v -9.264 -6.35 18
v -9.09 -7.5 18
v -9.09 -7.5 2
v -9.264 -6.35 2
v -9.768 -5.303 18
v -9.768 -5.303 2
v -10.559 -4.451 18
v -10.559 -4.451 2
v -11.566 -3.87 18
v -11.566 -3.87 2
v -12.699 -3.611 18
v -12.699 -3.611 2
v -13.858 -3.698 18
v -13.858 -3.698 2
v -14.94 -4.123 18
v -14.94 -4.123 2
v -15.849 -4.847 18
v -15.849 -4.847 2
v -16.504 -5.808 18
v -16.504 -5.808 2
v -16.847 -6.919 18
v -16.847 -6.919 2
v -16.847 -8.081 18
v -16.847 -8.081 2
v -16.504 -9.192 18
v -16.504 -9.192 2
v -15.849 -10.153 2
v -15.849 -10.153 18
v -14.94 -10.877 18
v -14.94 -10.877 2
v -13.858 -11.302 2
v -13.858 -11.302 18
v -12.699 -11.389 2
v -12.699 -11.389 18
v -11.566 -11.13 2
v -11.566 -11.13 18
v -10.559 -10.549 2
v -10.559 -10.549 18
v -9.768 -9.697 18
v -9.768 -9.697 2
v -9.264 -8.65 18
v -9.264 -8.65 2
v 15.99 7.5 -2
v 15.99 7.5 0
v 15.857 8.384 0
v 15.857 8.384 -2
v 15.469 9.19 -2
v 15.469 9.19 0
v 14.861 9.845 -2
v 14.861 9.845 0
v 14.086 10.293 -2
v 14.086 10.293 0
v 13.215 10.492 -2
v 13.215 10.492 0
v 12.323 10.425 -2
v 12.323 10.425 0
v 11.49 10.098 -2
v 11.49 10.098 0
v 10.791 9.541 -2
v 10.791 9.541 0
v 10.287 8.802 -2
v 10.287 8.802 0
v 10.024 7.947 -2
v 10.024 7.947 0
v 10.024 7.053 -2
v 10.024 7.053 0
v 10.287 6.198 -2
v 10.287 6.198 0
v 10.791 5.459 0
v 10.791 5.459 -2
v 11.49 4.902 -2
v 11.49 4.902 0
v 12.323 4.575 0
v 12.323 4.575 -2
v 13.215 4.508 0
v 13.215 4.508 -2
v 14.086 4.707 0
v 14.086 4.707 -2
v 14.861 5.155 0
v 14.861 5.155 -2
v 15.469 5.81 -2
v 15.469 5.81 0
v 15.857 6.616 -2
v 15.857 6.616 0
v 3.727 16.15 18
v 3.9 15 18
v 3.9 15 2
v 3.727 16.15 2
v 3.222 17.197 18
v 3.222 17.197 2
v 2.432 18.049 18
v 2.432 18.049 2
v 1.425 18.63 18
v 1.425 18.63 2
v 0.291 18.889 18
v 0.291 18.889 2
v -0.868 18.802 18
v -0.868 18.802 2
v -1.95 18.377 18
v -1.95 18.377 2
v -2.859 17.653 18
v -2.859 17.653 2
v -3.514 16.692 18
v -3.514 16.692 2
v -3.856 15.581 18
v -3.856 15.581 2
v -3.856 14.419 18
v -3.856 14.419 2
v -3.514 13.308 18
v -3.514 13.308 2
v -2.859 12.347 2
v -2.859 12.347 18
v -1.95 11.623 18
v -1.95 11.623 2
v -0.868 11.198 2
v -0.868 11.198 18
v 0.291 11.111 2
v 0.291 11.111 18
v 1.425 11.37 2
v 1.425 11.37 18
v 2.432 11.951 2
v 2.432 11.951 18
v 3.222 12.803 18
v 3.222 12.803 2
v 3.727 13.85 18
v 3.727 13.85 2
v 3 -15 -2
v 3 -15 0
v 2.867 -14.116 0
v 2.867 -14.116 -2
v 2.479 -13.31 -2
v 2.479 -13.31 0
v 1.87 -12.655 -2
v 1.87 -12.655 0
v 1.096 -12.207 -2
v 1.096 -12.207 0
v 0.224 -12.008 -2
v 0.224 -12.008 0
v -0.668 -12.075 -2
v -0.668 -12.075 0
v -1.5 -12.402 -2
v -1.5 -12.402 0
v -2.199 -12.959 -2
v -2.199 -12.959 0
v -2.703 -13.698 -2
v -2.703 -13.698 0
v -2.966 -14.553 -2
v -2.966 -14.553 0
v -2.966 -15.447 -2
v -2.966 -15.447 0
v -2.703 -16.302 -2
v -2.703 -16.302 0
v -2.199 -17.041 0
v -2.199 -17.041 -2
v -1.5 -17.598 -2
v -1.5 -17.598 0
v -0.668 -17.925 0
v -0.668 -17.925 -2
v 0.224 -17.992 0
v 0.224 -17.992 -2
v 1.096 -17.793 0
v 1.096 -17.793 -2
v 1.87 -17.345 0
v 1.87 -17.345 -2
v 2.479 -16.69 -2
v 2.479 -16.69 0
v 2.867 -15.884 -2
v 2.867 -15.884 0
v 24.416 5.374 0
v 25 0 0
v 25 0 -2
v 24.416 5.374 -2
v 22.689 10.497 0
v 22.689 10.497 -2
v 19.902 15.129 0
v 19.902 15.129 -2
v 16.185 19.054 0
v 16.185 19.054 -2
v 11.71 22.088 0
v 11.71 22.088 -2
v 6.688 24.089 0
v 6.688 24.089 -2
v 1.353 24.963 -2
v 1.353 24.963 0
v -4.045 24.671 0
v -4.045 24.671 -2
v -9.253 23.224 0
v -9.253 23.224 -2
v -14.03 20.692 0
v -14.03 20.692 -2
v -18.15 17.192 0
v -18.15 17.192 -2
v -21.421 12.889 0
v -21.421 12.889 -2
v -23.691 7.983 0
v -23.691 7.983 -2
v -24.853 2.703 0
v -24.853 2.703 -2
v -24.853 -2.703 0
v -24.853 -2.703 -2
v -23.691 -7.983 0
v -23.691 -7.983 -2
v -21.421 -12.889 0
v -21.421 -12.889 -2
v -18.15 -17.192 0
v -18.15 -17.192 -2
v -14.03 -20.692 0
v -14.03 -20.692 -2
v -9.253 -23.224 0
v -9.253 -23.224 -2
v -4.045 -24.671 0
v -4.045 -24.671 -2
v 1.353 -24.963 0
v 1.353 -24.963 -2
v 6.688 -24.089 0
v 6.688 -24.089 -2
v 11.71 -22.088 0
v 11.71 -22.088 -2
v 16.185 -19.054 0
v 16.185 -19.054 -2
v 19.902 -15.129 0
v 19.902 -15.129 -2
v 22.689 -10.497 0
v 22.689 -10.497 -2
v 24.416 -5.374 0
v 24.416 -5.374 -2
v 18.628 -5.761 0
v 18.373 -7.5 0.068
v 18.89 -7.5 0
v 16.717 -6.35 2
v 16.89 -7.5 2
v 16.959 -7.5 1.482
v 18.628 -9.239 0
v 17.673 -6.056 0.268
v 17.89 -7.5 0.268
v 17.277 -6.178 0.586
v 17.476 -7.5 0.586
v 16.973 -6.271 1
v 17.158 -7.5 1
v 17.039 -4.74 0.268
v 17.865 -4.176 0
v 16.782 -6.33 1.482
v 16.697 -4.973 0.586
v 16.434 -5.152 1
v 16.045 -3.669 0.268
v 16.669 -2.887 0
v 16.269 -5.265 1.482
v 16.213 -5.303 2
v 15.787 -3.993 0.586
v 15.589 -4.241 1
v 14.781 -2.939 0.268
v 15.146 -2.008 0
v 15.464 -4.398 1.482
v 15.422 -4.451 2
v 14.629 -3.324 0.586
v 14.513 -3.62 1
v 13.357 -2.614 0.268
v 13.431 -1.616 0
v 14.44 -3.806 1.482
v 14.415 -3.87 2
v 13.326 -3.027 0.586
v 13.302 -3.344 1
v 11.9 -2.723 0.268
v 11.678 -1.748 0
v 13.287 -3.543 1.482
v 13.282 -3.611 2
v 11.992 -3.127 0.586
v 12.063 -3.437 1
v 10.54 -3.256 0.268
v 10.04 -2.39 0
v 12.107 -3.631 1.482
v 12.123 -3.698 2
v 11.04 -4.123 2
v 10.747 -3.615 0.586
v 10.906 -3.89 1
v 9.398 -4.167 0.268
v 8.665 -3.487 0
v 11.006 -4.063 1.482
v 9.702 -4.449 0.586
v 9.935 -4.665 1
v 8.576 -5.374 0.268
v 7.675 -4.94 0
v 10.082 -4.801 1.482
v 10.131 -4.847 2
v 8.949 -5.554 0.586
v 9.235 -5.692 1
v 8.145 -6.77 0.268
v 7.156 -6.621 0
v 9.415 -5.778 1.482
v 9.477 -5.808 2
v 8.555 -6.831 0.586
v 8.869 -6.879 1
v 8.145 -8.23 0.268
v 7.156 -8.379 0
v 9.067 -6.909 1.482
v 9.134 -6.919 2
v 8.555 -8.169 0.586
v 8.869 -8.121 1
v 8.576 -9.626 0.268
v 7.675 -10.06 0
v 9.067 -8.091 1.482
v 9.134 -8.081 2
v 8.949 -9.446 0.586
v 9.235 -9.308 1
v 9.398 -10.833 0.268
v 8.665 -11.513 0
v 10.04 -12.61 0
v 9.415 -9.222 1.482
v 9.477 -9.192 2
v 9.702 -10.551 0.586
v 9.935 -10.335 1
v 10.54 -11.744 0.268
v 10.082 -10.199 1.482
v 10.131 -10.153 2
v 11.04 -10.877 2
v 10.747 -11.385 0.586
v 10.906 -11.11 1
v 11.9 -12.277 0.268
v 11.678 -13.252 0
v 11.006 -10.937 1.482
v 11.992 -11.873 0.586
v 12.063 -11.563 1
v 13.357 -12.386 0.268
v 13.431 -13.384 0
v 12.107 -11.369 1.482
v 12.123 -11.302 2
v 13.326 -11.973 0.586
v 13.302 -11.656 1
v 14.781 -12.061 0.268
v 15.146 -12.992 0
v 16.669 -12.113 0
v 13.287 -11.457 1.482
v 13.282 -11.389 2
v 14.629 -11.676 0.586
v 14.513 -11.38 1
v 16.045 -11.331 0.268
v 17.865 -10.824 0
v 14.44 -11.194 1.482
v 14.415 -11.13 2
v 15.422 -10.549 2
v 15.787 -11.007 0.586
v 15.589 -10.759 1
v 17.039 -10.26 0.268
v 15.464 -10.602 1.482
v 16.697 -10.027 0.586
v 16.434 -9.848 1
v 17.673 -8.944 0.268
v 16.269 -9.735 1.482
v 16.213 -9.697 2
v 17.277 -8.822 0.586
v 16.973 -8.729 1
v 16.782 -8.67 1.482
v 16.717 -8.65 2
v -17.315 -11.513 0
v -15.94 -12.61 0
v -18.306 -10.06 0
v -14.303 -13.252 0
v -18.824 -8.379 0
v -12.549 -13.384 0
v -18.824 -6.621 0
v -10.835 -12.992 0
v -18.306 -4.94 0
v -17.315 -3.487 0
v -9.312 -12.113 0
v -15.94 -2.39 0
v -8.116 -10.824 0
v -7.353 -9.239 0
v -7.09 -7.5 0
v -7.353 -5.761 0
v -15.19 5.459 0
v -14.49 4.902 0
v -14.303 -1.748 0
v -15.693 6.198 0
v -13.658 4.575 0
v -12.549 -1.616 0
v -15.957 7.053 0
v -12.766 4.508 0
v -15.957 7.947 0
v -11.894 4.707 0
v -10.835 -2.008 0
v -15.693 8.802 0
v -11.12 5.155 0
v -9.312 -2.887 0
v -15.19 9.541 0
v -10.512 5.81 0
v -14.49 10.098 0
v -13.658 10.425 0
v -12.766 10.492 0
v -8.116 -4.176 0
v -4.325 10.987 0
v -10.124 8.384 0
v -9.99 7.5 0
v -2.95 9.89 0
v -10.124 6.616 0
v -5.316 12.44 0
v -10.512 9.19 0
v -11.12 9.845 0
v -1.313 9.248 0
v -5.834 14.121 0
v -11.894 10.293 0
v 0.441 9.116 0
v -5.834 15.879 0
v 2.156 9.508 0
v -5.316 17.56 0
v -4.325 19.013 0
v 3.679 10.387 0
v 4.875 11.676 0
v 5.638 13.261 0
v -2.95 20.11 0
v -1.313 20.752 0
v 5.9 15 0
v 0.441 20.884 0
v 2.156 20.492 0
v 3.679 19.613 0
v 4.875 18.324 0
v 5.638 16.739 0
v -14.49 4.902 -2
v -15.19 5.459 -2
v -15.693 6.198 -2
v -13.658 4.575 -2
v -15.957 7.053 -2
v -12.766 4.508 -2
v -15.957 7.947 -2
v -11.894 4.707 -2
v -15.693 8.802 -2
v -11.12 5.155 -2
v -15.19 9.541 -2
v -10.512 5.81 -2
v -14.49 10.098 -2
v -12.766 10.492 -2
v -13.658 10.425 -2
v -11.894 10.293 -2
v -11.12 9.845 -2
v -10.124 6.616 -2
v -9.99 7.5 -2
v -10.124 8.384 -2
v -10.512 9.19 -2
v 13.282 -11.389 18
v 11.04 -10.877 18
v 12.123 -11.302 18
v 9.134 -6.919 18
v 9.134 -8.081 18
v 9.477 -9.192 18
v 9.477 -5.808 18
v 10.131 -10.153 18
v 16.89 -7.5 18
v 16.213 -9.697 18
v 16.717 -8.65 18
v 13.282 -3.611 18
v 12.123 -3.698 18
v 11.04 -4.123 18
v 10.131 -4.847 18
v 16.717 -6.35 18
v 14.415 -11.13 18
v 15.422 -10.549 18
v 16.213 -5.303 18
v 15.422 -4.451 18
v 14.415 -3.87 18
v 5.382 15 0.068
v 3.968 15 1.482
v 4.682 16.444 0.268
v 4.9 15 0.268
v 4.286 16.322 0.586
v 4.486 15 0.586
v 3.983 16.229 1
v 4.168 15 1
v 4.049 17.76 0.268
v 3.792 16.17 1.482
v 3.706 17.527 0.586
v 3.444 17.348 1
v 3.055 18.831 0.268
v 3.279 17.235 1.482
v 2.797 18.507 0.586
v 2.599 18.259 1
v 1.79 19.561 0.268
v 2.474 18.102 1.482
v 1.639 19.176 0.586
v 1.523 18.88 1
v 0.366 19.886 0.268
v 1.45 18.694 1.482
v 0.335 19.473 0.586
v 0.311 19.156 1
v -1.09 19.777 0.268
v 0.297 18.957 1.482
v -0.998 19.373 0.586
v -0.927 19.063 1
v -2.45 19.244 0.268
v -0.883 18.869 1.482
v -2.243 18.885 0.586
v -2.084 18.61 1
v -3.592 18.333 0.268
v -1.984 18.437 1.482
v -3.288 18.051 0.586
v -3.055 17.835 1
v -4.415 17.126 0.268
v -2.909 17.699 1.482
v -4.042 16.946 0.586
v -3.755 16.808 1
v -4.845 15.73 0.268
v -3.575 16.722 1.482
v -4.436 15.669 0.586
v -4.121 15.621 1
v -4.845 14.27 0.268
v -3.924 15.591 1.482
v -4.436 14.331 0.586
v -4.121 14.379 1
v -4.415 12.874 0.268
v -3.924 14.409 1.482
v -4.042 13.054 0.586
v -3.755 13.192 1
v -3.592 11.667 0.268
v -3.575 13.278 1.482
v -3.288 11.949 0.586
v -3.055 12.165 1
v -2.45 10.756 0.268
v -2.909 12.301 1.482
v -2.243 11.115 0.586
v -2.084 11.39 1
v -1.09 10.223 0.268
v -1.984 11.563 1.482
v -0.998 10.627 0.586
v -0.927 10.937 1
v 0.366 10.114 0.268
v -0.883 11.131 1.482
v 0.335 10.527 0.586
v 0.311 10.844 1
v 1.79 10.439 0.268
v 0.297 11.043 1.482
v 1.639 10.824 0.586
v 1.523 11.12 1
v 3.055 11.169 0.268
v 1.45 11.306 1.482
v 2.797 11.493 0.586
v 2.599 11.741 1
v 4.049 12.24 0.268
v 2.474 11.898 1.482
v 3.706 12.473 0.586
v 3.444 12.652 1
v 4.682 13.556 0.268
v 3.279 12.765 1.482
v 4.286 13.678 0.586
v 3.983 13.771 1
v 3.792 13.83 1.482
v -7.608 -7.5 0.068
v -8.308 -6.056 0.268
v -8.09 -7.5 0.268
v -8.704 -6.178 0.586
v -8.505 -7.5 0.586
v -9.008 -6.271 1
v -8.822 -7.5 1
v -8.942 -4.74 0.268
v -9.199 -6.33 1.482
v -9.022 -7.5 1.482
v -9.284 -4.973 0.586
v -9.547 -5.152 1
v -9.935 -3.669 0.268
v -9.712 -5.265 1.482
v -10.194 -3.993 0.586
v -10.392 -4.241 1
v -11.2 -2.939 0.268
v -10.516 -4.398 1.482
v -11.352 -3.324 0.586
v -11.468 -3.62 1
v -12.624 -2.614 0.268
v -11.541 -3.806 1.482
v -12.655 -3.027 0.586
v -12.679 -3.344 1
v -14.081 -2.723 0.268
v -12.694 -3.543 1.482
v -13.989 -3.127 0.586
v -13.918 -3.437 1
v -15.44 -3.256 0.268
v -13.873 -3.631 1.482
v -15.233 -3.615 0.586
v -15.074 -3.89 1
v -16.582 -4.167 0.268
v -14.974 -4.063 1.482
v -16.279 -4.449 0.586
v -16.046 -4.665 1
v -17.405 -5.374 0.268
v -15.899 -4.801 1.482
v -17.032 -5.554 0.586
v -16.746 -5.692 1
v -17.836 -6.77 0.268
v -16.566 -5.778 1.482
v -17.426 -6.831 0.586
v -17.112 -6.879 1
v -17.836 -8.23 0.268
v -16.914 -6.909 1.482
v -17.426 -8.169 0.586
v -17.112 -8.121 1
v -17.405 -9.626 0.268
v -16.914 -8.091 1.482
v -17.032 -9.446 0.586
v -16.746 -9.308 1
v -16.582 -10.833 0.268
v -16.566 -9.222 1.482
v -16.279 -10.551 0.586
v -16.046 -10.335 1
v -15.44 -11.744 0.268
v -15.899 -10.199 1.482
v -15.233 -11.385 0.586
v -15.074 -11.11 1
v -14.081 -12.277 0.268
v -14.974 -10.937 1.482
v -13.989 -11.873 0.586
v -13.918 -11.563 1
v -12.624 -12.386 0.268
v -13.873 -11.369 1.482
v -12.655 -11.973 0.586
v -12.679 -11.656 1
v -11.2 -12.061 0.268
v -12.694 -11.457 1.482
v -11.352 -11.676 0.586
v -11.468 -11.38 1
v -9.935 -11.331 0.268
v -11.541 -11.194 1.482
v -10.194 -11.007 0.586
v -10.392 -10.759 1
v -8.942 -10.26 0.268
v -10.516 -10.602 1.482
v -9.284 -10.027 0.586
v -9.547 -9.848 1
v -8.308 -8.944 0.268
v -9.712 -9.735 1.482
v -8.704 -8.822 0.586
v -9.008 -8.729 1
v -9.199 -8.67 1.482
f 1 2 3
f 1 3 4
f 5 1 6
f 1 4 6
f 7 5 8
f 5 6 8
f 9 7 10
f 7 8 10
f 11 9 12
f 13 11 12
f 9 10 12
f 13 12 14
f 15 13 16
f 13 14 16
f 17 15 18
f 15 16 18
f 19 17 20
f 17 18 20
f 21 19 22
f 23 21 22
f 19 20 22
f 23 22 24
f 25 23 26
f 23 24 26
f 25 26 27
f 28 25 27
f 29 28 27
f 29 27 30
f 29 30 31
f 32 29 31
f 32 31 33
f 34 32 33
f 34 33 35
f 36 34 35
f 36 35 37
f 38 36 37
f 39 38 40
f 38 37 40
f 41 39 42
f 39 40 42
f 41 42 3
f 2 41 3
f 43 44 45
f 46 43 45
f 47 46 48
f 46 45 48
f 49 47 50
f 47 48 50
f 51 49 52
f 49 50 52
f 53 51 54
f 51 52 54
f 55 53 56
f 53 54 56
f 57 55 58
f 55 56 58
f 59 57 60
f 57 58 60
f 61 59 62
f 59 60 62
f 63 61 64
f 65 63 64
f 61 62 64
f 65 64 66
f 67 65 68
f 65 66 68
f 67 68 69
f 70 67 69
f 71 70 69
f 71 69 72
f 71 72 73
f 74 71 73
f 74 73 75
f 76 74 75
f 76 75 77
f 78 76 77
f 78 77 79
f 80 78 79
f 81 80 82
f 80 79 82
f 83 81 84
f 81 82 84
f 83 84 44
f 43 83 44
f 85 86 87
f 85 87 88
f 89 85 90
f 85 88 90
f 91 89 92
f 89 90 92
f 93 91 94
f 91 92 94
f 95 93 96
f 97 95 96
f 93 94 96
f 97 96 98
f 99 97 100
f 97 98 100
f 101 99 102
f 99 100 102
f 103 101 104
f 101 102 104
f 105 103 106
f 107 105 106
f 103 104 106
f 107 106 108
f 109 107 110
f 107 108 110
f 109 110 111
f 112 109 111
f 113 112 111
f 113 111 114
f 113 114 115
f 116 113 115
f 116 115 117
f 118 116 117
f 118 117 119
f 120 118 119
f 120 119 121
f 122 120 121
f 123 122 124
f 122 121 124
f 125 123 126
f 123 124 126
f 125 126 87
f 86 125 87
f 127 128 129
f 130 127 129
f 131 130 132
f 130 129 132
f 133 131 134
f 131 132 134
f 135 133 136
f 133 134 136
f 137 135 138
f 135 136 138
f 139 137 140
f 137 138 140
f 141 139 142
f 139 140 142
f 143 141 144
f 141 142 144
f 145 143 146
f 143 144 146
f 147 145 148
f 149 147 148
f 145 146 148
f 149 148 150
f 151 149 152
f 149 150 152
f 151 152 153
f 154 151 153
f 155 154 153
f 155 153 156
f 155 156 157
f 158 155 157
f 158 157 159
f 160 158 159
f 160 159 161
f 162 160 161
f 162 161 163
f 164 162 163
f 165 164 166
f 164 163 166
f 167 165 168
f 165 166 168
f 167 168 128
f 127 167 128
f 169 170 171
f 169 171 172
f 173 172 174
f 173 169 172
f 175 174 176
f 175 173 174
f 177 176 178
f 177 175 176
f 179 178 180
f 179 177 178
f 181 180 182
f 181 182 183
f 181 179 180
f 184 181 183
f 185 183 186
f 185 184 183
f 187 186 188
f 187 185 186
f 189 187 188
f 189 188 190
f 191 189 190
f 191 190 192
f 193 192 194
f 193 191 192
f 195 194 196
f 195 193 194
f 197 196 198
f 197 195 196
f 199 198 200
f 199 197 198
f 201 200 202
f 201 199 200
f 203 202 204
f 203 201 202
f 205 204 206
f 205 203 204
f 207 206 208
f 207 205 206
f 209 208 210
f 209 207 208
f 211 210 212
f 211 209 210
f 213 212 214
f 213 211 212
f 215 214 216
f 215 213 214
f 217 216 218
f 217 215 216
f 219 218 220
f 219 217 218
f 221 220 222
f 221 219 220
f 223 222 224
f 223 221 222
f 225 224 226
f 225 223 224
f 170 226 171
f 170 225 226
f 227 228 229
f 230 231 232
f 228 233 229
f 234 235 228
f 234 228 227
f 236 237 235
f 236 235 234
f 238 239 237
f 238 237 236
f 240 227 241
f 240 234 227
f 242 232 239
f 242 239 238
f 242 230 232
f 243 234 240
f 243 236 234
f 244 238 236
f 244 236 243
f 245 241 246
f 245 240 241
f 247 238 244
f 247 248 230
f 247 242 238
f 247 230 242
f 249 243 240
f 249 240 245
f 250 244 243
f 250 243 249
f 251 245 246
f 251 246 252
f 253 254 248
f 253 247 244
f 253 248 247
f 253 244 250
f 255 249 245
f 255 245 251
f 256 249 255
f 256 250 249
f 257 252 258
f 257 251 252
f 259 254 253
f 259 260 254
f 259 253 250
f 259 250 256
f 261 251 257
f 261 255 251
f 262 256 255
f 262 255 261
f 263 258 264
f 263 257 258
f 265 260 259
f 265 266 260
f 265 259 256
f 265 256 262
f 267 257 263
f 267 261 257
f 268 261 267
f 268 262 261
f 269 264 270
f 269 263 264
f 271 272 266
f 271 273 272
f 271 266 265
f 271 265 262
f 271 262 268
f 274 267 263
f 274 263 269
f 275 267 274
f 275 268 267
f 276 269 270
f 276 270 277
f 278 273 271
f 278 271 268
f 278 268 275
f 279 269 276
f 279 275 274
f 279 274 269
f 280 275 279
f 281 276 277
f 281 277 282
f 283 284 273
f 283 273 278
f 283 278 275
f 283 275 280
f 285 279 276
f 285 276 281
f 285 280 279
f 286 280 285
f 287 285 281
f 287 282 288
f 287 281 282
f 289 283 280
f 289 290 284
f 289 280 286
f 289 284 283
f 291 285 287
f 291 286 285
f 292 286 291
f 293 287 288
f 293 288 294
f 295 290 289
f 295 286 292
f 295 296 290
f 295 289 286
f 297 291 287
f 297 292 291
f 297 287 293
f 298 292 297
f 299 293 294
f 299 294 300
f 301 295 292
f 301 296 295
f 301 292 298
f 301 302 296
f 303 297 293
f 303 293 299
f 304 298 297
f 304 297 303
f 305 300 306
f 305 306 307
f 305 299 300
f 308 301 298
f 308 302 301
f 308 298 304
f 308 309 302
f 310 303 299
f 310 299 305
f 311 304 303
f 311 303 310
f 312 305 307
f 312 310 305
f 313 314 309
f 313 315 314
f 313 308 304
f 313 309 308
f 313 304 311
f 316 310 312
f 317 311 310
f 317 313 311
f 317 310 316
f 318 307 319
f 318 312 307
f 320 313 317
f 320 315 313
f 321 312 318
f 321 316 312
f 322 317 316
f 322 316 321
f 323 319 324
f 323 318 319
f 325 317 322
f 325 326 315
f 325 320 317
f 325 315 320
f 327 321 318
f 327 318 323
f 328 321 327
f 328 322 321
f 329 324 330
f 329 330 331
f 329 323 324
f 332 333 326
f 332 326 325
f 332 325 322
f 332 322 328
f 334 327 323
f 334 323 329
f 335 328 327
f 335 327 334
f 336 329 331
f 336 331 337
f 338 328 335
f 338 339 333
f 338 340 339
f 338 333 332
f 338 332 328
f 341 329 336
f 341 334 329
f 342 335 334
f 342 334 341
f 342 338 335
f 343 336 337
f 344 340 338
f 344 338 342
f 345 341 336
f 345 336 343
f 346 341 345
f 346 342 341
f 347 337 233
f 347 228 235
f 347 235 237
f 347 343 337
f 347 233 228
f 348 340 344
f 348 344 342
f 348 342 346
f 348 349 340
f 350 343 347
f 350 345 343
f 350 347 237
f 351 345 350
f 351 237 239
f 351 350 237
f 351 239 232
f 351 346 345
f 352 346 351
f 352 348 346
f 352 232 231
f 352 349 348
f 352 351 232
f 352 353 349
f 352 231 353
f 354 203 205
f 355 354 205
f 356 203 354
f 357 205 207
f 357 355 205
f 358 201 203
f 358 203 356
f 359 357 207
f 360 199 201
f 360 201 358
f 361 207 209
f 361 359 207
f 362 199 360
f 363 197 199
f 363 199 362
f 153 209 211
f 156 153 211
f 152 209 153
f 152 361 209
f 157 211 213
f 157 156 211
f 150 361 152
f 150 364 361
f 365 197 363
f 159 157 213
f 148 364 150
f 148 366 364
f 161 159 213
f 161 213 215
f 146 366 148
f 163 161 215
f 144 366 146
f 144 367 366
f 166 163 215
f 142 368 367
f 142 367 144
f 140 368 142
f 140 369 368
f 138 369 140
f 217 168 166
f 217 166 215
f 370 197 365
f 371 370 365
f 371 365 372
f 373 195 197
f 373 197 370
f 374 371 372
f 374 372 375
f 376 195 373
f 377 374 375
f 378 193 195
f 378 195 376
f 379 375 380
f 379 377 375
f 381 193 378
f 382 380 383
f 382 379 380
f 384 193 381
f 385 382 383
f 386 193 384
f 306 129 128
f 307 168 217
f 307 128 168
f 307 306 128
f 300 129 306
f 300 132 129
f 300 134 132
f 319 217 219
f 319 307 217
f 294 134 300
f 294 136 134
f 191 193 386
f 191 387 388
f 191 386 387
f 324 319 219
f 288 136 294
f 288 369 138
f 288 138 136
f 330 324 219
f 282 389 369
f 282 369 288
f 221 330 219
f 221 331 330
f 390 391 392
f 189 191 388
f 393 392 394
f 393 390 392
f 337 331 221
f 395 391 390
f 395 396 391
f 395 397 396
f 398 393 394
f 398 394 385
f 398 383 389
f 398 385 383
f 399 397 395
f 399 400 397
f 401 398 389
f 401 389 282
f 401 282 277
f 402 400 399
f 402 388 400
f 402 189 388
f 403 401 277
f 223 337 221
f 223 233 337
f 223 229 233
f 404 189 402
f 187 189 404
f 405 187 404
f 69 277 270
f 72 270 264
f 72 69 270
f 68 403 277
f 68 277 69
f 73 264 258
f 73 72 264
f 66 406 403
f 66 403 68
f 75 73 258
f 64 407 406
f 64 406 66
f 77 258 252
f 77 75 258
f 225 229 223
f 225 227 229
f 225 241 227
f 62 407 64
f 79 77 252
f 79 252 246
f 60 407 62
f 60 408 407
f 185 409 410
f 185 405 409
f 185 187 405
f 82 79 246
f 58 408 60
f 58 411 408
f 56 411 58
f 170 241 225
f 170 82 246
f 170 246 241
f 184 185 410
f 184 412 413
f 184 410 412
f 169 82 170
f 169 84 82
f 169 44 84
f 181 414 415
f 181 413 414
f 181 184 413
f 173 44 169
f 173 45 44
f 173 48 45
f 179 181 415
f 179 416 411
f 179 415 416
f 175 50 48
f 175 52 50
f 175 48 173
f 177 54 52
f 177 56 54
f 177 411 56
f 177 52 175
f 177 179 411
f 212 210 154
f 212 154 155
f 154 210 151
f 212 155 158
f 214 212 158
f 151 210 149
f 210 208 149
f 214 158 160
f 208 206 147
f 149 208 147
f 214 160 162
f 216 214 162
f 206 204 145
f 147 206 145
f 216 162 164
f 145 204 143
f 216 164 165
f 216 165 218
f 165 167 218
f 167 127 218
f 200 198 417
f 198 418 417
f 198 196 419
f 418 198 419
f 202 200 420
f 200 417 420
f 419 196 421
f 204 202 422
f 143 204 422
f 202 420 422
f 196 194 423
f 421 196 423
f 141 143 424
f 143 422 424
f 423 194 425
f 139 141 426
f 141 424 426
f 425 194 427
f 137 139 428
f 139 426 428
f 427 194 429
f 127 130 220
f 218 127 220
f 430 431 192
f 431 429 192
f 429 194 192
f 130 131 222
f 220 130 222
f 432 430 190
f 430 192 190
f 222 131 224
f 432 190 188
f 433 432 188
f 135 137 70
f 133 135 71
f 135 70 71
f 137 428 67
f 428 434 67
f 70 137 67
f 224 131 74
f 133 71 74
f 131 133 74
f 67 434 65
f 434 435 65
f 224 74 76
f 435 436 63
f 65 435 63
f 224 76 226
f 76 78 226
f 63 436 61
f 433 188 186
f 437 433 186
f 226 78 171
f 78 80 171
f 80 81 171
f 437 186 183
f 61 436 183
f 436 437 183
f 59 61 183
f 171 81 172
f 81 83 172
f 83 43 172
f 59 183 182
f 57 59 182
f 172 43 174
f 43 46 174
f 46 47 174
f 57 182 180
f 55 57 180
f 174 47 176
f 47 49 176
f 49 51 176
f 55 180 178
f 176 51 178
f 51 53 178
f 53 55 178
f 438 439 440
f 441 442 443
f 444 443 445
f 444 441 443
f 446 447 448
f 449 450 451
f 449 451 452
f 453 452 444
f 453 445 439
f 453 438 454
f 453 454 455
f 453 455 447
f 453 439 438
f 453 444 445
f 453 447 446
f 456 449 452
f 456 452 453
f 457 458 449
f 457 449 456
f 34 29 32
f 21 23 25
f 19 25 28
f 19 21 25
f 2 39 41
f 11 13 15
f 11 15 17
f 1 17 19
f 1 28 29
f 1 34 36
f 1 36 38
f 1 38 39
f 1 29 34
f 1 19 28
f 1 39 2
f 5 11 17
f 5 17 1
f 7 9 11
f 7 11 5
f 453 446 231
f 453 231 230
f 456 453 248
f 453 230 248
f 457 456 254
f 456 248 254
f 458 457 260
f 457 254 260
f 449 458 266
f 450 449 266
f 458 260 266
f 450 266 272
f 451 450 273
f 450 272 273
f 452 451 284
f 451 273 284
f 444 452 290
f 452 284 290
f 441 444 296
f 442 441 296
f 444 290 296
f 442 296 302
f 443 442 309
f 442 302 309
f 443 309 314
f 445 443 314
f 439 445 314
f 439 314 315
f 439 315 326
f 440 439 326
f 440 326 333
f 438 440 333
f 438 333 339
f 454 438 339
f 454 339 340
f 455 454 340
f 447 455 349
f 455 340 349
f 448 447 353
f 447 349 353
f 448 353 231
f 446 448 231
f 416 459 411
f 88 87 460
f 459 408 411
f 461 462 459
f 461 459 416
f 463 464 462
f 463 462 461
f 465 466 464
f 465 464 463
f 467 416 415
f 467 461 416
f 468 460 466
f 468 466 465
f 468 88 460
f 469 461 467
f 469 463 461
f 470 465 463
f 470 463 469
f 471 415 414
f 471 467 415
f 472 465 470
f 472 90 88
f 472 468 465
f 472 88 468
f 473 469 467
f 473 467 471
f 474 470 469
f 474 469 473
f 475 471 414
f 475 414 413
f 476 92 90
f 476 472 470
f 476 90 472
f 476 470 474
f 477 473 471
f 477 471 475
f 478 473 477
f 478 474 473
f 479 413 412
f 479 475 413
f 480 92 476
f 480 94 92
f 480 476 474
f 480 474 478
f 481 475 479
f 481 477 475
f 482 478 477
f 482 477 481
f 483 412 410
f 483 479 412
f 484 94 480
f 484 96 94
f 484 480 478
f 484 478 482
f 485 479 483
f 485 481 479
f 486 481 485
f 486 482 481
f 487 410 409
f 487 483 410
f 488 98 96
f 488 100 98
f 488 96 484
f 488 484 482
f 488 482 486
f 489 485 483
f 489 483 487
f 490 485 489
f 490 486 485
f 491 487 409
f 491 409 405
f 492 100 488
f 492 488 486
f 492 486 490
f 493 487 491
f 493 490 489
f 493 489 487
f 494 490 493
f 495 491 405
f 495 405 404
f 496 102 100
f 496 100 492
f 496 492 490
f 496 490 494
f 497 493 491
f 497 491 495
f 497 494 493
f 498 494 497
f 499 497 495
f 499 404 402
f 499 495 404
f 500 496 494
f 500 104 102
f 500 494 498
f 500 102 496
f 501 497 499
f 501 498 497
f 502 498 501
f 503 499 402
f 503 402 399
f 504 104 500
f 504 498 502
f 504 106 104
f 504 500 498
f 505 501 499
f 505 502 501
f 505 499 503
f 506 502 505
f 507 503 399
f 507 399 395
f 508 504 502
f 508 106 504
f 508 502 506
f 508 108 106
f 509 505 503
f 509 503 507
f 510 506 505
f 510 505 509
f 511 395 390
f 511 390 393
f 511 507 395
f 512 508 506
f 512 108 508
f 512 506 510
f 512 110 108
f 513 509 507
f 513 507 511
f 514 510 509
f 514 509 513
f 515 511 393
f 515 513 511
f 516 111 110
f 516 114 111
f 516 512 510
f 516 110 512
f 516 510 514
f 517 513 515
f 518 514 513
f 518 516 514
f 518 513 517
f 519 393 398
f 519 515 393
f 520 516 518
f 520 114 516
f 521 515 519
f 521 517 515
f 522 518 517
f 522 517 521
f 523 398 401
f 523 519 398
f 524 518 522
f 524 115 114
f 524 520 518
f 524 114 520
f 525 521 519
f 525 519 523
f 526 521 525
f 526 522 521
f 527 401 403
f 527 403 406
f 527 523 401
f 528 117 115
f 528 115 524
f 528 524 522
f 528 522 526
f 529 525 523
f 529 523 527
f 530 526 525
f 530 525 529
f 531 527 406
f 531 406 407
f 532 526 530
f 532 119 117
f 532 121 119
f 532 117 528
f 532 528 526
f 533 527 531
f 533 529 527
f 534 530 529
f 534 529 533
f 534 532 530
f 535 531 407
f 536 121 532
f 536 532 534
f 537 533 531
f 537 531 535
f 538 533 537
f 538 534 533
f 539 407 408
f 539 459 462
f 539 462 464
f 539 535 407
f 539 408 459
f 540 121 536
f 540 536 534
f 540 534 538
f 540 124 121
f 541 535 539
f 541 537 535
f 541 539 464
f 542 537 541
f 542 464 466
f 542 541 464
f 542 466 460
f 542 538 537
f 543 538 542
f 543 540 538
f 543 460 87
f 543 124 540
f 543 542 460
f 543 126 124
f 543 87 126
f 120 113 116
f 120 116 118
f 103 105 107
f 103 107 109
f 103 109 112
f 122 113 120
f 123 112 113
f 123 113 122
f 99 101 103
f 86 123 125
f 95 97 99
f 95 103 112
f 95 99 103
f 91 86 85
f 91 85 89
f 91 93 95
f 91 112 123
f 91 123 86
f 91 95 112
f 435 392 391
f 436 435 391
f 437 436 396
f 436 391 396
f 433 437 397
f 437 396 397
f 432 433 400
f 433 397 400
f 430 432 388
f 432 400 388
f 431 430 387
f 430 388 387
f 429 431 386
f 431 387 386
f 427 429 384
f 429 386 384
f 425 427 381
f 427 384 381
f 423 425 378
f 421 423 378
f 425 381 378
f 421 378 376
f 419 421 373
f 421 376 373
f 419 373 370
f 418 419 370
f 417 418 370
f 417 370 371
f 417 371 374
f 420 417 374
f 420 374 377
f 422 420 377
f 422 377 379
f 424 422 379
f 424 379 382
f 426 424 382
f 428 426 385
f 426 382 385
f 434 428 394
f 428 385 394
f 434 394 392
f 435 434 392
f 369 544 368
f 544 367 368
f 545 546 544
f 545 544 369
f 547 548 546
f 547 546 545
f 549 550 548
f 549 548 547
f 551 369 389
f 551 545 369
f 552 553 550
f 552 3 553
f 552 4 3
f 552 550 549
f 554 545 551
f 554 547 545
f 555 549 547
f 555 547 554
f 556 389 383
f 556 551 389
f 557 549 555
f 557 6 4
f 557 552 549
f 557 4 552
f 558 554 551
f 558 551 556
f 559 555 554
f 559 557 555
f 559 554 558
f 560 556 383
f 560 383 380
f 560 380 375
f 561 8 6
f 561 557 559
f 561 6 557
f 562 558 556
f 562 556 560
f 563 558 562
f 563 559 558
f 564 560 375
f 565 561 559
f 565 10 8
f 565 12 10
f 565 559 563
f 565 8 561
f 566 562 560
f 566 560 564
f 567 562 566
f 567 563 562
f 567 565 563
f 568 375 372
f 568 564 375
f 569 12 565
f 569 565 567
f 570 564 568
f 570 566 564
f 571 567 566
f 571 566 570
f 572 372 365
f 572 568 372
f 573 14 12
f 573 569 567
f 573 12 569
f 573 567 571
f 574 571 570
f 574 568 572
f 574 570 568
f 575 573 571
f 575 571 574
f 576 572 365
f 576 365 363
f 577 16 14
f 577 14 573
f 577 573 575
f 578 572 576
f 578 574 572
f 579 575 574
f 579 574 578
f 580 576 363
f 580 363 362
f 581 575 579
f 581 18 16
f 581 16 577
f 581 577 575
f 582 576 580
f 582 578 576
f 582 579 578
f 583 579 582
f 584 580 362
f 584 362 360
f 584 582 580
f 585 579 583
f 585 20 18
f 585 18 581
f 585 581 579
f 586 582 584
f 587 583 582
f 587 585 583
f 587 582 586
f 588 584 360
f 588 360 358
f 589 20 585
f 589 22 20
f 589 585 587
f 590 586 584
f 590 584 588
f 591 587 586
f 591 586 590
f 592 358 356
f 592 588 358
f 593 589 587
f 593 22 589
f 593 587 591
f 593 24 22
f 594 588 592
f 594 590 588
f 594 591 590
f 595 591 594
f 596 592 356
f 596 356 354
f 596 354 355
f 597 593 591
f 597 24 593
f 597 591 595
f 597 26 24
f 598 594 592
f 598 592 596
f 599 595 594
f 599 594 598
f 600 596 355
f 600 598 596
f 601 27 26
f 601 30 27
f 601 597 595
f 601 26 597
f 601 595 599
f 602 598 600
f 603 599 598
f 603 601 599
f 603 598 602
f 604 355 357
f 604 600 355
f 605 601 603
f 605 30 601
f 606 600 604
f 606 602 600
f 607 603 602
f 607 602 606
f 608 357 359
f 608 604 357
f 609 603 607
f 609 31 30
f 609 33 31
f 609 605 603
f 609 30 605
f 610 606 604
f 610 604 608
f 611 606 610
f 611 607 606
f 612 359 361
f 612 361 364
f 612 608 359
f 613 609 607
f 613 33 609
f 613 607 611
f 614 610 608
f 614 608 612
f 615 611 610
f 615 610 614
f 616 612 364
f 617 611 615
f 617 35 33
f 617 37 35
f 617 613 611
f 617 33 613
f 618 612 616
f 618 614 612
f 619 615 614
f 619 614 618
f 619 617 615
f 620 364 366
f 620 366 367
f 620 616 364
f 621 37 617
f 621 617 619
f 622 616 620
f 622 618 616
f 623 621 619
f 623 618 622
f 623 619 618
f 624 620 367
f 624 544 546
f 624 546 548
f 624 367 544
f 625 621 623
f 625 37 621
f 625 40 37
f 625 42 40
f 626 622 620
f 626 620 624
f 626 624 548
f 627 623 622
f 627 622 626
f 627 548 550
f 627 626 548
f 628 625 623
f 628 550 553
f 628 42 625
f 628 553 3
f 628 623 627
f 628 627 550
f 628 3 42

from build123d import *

# Parameters (mm, degrees)
F1_R     = 25
F2_DEPTH = 2
F0_R     = 3.9
F3_DEPTH = 18
F4_R     = 2
F0_R_2   = 3
F5_DEPTH = 2


with BuildPart() as f2:
    # F1 (on Top) → F2 (new body)
    with BuildSketch(Plane.XY):
        Circle(F1_R)
    extrude(amount=-F2_DEPTH)

    # F0 (on Top) → F3 (join)
    with BuildSketch(Plane.XY):
        with Locations((-12.9903810568, -7.5)):
            Circle(F0_R)
        with Locations((0, 15)):
            Circle(F0_R)
        with Locations((12.9903810568, -7.5)):
            Circle(F0_R)
    extrude(amount=F3_DEPTH)

    # F4
    f4_edges = [f2.edges().sort_by_distance(p)[0] for p in [
        (9.090381, -7.5, 0),
        (-3.9, 15, 0),
        (-16.890381, -7.5, 0),
    ]]
    fillet(f4_edges, radius=F4_R)

    # F0 (on Top) → F5 (cut)
    with BuildSketch(Plane.XY):
        with Locations((12.9903810568, 7.5)):
            Circle(F0_R_2)
        with Locations((-12.9903810568, 7.5)):
            Circle(F0_R_2)
        with Locations((0, -15)):
            Circle(F0_R_2)
    extrude(amount=-F5_DEPTH, mode=Mode.SUBTRACT)


solid = f2.part
